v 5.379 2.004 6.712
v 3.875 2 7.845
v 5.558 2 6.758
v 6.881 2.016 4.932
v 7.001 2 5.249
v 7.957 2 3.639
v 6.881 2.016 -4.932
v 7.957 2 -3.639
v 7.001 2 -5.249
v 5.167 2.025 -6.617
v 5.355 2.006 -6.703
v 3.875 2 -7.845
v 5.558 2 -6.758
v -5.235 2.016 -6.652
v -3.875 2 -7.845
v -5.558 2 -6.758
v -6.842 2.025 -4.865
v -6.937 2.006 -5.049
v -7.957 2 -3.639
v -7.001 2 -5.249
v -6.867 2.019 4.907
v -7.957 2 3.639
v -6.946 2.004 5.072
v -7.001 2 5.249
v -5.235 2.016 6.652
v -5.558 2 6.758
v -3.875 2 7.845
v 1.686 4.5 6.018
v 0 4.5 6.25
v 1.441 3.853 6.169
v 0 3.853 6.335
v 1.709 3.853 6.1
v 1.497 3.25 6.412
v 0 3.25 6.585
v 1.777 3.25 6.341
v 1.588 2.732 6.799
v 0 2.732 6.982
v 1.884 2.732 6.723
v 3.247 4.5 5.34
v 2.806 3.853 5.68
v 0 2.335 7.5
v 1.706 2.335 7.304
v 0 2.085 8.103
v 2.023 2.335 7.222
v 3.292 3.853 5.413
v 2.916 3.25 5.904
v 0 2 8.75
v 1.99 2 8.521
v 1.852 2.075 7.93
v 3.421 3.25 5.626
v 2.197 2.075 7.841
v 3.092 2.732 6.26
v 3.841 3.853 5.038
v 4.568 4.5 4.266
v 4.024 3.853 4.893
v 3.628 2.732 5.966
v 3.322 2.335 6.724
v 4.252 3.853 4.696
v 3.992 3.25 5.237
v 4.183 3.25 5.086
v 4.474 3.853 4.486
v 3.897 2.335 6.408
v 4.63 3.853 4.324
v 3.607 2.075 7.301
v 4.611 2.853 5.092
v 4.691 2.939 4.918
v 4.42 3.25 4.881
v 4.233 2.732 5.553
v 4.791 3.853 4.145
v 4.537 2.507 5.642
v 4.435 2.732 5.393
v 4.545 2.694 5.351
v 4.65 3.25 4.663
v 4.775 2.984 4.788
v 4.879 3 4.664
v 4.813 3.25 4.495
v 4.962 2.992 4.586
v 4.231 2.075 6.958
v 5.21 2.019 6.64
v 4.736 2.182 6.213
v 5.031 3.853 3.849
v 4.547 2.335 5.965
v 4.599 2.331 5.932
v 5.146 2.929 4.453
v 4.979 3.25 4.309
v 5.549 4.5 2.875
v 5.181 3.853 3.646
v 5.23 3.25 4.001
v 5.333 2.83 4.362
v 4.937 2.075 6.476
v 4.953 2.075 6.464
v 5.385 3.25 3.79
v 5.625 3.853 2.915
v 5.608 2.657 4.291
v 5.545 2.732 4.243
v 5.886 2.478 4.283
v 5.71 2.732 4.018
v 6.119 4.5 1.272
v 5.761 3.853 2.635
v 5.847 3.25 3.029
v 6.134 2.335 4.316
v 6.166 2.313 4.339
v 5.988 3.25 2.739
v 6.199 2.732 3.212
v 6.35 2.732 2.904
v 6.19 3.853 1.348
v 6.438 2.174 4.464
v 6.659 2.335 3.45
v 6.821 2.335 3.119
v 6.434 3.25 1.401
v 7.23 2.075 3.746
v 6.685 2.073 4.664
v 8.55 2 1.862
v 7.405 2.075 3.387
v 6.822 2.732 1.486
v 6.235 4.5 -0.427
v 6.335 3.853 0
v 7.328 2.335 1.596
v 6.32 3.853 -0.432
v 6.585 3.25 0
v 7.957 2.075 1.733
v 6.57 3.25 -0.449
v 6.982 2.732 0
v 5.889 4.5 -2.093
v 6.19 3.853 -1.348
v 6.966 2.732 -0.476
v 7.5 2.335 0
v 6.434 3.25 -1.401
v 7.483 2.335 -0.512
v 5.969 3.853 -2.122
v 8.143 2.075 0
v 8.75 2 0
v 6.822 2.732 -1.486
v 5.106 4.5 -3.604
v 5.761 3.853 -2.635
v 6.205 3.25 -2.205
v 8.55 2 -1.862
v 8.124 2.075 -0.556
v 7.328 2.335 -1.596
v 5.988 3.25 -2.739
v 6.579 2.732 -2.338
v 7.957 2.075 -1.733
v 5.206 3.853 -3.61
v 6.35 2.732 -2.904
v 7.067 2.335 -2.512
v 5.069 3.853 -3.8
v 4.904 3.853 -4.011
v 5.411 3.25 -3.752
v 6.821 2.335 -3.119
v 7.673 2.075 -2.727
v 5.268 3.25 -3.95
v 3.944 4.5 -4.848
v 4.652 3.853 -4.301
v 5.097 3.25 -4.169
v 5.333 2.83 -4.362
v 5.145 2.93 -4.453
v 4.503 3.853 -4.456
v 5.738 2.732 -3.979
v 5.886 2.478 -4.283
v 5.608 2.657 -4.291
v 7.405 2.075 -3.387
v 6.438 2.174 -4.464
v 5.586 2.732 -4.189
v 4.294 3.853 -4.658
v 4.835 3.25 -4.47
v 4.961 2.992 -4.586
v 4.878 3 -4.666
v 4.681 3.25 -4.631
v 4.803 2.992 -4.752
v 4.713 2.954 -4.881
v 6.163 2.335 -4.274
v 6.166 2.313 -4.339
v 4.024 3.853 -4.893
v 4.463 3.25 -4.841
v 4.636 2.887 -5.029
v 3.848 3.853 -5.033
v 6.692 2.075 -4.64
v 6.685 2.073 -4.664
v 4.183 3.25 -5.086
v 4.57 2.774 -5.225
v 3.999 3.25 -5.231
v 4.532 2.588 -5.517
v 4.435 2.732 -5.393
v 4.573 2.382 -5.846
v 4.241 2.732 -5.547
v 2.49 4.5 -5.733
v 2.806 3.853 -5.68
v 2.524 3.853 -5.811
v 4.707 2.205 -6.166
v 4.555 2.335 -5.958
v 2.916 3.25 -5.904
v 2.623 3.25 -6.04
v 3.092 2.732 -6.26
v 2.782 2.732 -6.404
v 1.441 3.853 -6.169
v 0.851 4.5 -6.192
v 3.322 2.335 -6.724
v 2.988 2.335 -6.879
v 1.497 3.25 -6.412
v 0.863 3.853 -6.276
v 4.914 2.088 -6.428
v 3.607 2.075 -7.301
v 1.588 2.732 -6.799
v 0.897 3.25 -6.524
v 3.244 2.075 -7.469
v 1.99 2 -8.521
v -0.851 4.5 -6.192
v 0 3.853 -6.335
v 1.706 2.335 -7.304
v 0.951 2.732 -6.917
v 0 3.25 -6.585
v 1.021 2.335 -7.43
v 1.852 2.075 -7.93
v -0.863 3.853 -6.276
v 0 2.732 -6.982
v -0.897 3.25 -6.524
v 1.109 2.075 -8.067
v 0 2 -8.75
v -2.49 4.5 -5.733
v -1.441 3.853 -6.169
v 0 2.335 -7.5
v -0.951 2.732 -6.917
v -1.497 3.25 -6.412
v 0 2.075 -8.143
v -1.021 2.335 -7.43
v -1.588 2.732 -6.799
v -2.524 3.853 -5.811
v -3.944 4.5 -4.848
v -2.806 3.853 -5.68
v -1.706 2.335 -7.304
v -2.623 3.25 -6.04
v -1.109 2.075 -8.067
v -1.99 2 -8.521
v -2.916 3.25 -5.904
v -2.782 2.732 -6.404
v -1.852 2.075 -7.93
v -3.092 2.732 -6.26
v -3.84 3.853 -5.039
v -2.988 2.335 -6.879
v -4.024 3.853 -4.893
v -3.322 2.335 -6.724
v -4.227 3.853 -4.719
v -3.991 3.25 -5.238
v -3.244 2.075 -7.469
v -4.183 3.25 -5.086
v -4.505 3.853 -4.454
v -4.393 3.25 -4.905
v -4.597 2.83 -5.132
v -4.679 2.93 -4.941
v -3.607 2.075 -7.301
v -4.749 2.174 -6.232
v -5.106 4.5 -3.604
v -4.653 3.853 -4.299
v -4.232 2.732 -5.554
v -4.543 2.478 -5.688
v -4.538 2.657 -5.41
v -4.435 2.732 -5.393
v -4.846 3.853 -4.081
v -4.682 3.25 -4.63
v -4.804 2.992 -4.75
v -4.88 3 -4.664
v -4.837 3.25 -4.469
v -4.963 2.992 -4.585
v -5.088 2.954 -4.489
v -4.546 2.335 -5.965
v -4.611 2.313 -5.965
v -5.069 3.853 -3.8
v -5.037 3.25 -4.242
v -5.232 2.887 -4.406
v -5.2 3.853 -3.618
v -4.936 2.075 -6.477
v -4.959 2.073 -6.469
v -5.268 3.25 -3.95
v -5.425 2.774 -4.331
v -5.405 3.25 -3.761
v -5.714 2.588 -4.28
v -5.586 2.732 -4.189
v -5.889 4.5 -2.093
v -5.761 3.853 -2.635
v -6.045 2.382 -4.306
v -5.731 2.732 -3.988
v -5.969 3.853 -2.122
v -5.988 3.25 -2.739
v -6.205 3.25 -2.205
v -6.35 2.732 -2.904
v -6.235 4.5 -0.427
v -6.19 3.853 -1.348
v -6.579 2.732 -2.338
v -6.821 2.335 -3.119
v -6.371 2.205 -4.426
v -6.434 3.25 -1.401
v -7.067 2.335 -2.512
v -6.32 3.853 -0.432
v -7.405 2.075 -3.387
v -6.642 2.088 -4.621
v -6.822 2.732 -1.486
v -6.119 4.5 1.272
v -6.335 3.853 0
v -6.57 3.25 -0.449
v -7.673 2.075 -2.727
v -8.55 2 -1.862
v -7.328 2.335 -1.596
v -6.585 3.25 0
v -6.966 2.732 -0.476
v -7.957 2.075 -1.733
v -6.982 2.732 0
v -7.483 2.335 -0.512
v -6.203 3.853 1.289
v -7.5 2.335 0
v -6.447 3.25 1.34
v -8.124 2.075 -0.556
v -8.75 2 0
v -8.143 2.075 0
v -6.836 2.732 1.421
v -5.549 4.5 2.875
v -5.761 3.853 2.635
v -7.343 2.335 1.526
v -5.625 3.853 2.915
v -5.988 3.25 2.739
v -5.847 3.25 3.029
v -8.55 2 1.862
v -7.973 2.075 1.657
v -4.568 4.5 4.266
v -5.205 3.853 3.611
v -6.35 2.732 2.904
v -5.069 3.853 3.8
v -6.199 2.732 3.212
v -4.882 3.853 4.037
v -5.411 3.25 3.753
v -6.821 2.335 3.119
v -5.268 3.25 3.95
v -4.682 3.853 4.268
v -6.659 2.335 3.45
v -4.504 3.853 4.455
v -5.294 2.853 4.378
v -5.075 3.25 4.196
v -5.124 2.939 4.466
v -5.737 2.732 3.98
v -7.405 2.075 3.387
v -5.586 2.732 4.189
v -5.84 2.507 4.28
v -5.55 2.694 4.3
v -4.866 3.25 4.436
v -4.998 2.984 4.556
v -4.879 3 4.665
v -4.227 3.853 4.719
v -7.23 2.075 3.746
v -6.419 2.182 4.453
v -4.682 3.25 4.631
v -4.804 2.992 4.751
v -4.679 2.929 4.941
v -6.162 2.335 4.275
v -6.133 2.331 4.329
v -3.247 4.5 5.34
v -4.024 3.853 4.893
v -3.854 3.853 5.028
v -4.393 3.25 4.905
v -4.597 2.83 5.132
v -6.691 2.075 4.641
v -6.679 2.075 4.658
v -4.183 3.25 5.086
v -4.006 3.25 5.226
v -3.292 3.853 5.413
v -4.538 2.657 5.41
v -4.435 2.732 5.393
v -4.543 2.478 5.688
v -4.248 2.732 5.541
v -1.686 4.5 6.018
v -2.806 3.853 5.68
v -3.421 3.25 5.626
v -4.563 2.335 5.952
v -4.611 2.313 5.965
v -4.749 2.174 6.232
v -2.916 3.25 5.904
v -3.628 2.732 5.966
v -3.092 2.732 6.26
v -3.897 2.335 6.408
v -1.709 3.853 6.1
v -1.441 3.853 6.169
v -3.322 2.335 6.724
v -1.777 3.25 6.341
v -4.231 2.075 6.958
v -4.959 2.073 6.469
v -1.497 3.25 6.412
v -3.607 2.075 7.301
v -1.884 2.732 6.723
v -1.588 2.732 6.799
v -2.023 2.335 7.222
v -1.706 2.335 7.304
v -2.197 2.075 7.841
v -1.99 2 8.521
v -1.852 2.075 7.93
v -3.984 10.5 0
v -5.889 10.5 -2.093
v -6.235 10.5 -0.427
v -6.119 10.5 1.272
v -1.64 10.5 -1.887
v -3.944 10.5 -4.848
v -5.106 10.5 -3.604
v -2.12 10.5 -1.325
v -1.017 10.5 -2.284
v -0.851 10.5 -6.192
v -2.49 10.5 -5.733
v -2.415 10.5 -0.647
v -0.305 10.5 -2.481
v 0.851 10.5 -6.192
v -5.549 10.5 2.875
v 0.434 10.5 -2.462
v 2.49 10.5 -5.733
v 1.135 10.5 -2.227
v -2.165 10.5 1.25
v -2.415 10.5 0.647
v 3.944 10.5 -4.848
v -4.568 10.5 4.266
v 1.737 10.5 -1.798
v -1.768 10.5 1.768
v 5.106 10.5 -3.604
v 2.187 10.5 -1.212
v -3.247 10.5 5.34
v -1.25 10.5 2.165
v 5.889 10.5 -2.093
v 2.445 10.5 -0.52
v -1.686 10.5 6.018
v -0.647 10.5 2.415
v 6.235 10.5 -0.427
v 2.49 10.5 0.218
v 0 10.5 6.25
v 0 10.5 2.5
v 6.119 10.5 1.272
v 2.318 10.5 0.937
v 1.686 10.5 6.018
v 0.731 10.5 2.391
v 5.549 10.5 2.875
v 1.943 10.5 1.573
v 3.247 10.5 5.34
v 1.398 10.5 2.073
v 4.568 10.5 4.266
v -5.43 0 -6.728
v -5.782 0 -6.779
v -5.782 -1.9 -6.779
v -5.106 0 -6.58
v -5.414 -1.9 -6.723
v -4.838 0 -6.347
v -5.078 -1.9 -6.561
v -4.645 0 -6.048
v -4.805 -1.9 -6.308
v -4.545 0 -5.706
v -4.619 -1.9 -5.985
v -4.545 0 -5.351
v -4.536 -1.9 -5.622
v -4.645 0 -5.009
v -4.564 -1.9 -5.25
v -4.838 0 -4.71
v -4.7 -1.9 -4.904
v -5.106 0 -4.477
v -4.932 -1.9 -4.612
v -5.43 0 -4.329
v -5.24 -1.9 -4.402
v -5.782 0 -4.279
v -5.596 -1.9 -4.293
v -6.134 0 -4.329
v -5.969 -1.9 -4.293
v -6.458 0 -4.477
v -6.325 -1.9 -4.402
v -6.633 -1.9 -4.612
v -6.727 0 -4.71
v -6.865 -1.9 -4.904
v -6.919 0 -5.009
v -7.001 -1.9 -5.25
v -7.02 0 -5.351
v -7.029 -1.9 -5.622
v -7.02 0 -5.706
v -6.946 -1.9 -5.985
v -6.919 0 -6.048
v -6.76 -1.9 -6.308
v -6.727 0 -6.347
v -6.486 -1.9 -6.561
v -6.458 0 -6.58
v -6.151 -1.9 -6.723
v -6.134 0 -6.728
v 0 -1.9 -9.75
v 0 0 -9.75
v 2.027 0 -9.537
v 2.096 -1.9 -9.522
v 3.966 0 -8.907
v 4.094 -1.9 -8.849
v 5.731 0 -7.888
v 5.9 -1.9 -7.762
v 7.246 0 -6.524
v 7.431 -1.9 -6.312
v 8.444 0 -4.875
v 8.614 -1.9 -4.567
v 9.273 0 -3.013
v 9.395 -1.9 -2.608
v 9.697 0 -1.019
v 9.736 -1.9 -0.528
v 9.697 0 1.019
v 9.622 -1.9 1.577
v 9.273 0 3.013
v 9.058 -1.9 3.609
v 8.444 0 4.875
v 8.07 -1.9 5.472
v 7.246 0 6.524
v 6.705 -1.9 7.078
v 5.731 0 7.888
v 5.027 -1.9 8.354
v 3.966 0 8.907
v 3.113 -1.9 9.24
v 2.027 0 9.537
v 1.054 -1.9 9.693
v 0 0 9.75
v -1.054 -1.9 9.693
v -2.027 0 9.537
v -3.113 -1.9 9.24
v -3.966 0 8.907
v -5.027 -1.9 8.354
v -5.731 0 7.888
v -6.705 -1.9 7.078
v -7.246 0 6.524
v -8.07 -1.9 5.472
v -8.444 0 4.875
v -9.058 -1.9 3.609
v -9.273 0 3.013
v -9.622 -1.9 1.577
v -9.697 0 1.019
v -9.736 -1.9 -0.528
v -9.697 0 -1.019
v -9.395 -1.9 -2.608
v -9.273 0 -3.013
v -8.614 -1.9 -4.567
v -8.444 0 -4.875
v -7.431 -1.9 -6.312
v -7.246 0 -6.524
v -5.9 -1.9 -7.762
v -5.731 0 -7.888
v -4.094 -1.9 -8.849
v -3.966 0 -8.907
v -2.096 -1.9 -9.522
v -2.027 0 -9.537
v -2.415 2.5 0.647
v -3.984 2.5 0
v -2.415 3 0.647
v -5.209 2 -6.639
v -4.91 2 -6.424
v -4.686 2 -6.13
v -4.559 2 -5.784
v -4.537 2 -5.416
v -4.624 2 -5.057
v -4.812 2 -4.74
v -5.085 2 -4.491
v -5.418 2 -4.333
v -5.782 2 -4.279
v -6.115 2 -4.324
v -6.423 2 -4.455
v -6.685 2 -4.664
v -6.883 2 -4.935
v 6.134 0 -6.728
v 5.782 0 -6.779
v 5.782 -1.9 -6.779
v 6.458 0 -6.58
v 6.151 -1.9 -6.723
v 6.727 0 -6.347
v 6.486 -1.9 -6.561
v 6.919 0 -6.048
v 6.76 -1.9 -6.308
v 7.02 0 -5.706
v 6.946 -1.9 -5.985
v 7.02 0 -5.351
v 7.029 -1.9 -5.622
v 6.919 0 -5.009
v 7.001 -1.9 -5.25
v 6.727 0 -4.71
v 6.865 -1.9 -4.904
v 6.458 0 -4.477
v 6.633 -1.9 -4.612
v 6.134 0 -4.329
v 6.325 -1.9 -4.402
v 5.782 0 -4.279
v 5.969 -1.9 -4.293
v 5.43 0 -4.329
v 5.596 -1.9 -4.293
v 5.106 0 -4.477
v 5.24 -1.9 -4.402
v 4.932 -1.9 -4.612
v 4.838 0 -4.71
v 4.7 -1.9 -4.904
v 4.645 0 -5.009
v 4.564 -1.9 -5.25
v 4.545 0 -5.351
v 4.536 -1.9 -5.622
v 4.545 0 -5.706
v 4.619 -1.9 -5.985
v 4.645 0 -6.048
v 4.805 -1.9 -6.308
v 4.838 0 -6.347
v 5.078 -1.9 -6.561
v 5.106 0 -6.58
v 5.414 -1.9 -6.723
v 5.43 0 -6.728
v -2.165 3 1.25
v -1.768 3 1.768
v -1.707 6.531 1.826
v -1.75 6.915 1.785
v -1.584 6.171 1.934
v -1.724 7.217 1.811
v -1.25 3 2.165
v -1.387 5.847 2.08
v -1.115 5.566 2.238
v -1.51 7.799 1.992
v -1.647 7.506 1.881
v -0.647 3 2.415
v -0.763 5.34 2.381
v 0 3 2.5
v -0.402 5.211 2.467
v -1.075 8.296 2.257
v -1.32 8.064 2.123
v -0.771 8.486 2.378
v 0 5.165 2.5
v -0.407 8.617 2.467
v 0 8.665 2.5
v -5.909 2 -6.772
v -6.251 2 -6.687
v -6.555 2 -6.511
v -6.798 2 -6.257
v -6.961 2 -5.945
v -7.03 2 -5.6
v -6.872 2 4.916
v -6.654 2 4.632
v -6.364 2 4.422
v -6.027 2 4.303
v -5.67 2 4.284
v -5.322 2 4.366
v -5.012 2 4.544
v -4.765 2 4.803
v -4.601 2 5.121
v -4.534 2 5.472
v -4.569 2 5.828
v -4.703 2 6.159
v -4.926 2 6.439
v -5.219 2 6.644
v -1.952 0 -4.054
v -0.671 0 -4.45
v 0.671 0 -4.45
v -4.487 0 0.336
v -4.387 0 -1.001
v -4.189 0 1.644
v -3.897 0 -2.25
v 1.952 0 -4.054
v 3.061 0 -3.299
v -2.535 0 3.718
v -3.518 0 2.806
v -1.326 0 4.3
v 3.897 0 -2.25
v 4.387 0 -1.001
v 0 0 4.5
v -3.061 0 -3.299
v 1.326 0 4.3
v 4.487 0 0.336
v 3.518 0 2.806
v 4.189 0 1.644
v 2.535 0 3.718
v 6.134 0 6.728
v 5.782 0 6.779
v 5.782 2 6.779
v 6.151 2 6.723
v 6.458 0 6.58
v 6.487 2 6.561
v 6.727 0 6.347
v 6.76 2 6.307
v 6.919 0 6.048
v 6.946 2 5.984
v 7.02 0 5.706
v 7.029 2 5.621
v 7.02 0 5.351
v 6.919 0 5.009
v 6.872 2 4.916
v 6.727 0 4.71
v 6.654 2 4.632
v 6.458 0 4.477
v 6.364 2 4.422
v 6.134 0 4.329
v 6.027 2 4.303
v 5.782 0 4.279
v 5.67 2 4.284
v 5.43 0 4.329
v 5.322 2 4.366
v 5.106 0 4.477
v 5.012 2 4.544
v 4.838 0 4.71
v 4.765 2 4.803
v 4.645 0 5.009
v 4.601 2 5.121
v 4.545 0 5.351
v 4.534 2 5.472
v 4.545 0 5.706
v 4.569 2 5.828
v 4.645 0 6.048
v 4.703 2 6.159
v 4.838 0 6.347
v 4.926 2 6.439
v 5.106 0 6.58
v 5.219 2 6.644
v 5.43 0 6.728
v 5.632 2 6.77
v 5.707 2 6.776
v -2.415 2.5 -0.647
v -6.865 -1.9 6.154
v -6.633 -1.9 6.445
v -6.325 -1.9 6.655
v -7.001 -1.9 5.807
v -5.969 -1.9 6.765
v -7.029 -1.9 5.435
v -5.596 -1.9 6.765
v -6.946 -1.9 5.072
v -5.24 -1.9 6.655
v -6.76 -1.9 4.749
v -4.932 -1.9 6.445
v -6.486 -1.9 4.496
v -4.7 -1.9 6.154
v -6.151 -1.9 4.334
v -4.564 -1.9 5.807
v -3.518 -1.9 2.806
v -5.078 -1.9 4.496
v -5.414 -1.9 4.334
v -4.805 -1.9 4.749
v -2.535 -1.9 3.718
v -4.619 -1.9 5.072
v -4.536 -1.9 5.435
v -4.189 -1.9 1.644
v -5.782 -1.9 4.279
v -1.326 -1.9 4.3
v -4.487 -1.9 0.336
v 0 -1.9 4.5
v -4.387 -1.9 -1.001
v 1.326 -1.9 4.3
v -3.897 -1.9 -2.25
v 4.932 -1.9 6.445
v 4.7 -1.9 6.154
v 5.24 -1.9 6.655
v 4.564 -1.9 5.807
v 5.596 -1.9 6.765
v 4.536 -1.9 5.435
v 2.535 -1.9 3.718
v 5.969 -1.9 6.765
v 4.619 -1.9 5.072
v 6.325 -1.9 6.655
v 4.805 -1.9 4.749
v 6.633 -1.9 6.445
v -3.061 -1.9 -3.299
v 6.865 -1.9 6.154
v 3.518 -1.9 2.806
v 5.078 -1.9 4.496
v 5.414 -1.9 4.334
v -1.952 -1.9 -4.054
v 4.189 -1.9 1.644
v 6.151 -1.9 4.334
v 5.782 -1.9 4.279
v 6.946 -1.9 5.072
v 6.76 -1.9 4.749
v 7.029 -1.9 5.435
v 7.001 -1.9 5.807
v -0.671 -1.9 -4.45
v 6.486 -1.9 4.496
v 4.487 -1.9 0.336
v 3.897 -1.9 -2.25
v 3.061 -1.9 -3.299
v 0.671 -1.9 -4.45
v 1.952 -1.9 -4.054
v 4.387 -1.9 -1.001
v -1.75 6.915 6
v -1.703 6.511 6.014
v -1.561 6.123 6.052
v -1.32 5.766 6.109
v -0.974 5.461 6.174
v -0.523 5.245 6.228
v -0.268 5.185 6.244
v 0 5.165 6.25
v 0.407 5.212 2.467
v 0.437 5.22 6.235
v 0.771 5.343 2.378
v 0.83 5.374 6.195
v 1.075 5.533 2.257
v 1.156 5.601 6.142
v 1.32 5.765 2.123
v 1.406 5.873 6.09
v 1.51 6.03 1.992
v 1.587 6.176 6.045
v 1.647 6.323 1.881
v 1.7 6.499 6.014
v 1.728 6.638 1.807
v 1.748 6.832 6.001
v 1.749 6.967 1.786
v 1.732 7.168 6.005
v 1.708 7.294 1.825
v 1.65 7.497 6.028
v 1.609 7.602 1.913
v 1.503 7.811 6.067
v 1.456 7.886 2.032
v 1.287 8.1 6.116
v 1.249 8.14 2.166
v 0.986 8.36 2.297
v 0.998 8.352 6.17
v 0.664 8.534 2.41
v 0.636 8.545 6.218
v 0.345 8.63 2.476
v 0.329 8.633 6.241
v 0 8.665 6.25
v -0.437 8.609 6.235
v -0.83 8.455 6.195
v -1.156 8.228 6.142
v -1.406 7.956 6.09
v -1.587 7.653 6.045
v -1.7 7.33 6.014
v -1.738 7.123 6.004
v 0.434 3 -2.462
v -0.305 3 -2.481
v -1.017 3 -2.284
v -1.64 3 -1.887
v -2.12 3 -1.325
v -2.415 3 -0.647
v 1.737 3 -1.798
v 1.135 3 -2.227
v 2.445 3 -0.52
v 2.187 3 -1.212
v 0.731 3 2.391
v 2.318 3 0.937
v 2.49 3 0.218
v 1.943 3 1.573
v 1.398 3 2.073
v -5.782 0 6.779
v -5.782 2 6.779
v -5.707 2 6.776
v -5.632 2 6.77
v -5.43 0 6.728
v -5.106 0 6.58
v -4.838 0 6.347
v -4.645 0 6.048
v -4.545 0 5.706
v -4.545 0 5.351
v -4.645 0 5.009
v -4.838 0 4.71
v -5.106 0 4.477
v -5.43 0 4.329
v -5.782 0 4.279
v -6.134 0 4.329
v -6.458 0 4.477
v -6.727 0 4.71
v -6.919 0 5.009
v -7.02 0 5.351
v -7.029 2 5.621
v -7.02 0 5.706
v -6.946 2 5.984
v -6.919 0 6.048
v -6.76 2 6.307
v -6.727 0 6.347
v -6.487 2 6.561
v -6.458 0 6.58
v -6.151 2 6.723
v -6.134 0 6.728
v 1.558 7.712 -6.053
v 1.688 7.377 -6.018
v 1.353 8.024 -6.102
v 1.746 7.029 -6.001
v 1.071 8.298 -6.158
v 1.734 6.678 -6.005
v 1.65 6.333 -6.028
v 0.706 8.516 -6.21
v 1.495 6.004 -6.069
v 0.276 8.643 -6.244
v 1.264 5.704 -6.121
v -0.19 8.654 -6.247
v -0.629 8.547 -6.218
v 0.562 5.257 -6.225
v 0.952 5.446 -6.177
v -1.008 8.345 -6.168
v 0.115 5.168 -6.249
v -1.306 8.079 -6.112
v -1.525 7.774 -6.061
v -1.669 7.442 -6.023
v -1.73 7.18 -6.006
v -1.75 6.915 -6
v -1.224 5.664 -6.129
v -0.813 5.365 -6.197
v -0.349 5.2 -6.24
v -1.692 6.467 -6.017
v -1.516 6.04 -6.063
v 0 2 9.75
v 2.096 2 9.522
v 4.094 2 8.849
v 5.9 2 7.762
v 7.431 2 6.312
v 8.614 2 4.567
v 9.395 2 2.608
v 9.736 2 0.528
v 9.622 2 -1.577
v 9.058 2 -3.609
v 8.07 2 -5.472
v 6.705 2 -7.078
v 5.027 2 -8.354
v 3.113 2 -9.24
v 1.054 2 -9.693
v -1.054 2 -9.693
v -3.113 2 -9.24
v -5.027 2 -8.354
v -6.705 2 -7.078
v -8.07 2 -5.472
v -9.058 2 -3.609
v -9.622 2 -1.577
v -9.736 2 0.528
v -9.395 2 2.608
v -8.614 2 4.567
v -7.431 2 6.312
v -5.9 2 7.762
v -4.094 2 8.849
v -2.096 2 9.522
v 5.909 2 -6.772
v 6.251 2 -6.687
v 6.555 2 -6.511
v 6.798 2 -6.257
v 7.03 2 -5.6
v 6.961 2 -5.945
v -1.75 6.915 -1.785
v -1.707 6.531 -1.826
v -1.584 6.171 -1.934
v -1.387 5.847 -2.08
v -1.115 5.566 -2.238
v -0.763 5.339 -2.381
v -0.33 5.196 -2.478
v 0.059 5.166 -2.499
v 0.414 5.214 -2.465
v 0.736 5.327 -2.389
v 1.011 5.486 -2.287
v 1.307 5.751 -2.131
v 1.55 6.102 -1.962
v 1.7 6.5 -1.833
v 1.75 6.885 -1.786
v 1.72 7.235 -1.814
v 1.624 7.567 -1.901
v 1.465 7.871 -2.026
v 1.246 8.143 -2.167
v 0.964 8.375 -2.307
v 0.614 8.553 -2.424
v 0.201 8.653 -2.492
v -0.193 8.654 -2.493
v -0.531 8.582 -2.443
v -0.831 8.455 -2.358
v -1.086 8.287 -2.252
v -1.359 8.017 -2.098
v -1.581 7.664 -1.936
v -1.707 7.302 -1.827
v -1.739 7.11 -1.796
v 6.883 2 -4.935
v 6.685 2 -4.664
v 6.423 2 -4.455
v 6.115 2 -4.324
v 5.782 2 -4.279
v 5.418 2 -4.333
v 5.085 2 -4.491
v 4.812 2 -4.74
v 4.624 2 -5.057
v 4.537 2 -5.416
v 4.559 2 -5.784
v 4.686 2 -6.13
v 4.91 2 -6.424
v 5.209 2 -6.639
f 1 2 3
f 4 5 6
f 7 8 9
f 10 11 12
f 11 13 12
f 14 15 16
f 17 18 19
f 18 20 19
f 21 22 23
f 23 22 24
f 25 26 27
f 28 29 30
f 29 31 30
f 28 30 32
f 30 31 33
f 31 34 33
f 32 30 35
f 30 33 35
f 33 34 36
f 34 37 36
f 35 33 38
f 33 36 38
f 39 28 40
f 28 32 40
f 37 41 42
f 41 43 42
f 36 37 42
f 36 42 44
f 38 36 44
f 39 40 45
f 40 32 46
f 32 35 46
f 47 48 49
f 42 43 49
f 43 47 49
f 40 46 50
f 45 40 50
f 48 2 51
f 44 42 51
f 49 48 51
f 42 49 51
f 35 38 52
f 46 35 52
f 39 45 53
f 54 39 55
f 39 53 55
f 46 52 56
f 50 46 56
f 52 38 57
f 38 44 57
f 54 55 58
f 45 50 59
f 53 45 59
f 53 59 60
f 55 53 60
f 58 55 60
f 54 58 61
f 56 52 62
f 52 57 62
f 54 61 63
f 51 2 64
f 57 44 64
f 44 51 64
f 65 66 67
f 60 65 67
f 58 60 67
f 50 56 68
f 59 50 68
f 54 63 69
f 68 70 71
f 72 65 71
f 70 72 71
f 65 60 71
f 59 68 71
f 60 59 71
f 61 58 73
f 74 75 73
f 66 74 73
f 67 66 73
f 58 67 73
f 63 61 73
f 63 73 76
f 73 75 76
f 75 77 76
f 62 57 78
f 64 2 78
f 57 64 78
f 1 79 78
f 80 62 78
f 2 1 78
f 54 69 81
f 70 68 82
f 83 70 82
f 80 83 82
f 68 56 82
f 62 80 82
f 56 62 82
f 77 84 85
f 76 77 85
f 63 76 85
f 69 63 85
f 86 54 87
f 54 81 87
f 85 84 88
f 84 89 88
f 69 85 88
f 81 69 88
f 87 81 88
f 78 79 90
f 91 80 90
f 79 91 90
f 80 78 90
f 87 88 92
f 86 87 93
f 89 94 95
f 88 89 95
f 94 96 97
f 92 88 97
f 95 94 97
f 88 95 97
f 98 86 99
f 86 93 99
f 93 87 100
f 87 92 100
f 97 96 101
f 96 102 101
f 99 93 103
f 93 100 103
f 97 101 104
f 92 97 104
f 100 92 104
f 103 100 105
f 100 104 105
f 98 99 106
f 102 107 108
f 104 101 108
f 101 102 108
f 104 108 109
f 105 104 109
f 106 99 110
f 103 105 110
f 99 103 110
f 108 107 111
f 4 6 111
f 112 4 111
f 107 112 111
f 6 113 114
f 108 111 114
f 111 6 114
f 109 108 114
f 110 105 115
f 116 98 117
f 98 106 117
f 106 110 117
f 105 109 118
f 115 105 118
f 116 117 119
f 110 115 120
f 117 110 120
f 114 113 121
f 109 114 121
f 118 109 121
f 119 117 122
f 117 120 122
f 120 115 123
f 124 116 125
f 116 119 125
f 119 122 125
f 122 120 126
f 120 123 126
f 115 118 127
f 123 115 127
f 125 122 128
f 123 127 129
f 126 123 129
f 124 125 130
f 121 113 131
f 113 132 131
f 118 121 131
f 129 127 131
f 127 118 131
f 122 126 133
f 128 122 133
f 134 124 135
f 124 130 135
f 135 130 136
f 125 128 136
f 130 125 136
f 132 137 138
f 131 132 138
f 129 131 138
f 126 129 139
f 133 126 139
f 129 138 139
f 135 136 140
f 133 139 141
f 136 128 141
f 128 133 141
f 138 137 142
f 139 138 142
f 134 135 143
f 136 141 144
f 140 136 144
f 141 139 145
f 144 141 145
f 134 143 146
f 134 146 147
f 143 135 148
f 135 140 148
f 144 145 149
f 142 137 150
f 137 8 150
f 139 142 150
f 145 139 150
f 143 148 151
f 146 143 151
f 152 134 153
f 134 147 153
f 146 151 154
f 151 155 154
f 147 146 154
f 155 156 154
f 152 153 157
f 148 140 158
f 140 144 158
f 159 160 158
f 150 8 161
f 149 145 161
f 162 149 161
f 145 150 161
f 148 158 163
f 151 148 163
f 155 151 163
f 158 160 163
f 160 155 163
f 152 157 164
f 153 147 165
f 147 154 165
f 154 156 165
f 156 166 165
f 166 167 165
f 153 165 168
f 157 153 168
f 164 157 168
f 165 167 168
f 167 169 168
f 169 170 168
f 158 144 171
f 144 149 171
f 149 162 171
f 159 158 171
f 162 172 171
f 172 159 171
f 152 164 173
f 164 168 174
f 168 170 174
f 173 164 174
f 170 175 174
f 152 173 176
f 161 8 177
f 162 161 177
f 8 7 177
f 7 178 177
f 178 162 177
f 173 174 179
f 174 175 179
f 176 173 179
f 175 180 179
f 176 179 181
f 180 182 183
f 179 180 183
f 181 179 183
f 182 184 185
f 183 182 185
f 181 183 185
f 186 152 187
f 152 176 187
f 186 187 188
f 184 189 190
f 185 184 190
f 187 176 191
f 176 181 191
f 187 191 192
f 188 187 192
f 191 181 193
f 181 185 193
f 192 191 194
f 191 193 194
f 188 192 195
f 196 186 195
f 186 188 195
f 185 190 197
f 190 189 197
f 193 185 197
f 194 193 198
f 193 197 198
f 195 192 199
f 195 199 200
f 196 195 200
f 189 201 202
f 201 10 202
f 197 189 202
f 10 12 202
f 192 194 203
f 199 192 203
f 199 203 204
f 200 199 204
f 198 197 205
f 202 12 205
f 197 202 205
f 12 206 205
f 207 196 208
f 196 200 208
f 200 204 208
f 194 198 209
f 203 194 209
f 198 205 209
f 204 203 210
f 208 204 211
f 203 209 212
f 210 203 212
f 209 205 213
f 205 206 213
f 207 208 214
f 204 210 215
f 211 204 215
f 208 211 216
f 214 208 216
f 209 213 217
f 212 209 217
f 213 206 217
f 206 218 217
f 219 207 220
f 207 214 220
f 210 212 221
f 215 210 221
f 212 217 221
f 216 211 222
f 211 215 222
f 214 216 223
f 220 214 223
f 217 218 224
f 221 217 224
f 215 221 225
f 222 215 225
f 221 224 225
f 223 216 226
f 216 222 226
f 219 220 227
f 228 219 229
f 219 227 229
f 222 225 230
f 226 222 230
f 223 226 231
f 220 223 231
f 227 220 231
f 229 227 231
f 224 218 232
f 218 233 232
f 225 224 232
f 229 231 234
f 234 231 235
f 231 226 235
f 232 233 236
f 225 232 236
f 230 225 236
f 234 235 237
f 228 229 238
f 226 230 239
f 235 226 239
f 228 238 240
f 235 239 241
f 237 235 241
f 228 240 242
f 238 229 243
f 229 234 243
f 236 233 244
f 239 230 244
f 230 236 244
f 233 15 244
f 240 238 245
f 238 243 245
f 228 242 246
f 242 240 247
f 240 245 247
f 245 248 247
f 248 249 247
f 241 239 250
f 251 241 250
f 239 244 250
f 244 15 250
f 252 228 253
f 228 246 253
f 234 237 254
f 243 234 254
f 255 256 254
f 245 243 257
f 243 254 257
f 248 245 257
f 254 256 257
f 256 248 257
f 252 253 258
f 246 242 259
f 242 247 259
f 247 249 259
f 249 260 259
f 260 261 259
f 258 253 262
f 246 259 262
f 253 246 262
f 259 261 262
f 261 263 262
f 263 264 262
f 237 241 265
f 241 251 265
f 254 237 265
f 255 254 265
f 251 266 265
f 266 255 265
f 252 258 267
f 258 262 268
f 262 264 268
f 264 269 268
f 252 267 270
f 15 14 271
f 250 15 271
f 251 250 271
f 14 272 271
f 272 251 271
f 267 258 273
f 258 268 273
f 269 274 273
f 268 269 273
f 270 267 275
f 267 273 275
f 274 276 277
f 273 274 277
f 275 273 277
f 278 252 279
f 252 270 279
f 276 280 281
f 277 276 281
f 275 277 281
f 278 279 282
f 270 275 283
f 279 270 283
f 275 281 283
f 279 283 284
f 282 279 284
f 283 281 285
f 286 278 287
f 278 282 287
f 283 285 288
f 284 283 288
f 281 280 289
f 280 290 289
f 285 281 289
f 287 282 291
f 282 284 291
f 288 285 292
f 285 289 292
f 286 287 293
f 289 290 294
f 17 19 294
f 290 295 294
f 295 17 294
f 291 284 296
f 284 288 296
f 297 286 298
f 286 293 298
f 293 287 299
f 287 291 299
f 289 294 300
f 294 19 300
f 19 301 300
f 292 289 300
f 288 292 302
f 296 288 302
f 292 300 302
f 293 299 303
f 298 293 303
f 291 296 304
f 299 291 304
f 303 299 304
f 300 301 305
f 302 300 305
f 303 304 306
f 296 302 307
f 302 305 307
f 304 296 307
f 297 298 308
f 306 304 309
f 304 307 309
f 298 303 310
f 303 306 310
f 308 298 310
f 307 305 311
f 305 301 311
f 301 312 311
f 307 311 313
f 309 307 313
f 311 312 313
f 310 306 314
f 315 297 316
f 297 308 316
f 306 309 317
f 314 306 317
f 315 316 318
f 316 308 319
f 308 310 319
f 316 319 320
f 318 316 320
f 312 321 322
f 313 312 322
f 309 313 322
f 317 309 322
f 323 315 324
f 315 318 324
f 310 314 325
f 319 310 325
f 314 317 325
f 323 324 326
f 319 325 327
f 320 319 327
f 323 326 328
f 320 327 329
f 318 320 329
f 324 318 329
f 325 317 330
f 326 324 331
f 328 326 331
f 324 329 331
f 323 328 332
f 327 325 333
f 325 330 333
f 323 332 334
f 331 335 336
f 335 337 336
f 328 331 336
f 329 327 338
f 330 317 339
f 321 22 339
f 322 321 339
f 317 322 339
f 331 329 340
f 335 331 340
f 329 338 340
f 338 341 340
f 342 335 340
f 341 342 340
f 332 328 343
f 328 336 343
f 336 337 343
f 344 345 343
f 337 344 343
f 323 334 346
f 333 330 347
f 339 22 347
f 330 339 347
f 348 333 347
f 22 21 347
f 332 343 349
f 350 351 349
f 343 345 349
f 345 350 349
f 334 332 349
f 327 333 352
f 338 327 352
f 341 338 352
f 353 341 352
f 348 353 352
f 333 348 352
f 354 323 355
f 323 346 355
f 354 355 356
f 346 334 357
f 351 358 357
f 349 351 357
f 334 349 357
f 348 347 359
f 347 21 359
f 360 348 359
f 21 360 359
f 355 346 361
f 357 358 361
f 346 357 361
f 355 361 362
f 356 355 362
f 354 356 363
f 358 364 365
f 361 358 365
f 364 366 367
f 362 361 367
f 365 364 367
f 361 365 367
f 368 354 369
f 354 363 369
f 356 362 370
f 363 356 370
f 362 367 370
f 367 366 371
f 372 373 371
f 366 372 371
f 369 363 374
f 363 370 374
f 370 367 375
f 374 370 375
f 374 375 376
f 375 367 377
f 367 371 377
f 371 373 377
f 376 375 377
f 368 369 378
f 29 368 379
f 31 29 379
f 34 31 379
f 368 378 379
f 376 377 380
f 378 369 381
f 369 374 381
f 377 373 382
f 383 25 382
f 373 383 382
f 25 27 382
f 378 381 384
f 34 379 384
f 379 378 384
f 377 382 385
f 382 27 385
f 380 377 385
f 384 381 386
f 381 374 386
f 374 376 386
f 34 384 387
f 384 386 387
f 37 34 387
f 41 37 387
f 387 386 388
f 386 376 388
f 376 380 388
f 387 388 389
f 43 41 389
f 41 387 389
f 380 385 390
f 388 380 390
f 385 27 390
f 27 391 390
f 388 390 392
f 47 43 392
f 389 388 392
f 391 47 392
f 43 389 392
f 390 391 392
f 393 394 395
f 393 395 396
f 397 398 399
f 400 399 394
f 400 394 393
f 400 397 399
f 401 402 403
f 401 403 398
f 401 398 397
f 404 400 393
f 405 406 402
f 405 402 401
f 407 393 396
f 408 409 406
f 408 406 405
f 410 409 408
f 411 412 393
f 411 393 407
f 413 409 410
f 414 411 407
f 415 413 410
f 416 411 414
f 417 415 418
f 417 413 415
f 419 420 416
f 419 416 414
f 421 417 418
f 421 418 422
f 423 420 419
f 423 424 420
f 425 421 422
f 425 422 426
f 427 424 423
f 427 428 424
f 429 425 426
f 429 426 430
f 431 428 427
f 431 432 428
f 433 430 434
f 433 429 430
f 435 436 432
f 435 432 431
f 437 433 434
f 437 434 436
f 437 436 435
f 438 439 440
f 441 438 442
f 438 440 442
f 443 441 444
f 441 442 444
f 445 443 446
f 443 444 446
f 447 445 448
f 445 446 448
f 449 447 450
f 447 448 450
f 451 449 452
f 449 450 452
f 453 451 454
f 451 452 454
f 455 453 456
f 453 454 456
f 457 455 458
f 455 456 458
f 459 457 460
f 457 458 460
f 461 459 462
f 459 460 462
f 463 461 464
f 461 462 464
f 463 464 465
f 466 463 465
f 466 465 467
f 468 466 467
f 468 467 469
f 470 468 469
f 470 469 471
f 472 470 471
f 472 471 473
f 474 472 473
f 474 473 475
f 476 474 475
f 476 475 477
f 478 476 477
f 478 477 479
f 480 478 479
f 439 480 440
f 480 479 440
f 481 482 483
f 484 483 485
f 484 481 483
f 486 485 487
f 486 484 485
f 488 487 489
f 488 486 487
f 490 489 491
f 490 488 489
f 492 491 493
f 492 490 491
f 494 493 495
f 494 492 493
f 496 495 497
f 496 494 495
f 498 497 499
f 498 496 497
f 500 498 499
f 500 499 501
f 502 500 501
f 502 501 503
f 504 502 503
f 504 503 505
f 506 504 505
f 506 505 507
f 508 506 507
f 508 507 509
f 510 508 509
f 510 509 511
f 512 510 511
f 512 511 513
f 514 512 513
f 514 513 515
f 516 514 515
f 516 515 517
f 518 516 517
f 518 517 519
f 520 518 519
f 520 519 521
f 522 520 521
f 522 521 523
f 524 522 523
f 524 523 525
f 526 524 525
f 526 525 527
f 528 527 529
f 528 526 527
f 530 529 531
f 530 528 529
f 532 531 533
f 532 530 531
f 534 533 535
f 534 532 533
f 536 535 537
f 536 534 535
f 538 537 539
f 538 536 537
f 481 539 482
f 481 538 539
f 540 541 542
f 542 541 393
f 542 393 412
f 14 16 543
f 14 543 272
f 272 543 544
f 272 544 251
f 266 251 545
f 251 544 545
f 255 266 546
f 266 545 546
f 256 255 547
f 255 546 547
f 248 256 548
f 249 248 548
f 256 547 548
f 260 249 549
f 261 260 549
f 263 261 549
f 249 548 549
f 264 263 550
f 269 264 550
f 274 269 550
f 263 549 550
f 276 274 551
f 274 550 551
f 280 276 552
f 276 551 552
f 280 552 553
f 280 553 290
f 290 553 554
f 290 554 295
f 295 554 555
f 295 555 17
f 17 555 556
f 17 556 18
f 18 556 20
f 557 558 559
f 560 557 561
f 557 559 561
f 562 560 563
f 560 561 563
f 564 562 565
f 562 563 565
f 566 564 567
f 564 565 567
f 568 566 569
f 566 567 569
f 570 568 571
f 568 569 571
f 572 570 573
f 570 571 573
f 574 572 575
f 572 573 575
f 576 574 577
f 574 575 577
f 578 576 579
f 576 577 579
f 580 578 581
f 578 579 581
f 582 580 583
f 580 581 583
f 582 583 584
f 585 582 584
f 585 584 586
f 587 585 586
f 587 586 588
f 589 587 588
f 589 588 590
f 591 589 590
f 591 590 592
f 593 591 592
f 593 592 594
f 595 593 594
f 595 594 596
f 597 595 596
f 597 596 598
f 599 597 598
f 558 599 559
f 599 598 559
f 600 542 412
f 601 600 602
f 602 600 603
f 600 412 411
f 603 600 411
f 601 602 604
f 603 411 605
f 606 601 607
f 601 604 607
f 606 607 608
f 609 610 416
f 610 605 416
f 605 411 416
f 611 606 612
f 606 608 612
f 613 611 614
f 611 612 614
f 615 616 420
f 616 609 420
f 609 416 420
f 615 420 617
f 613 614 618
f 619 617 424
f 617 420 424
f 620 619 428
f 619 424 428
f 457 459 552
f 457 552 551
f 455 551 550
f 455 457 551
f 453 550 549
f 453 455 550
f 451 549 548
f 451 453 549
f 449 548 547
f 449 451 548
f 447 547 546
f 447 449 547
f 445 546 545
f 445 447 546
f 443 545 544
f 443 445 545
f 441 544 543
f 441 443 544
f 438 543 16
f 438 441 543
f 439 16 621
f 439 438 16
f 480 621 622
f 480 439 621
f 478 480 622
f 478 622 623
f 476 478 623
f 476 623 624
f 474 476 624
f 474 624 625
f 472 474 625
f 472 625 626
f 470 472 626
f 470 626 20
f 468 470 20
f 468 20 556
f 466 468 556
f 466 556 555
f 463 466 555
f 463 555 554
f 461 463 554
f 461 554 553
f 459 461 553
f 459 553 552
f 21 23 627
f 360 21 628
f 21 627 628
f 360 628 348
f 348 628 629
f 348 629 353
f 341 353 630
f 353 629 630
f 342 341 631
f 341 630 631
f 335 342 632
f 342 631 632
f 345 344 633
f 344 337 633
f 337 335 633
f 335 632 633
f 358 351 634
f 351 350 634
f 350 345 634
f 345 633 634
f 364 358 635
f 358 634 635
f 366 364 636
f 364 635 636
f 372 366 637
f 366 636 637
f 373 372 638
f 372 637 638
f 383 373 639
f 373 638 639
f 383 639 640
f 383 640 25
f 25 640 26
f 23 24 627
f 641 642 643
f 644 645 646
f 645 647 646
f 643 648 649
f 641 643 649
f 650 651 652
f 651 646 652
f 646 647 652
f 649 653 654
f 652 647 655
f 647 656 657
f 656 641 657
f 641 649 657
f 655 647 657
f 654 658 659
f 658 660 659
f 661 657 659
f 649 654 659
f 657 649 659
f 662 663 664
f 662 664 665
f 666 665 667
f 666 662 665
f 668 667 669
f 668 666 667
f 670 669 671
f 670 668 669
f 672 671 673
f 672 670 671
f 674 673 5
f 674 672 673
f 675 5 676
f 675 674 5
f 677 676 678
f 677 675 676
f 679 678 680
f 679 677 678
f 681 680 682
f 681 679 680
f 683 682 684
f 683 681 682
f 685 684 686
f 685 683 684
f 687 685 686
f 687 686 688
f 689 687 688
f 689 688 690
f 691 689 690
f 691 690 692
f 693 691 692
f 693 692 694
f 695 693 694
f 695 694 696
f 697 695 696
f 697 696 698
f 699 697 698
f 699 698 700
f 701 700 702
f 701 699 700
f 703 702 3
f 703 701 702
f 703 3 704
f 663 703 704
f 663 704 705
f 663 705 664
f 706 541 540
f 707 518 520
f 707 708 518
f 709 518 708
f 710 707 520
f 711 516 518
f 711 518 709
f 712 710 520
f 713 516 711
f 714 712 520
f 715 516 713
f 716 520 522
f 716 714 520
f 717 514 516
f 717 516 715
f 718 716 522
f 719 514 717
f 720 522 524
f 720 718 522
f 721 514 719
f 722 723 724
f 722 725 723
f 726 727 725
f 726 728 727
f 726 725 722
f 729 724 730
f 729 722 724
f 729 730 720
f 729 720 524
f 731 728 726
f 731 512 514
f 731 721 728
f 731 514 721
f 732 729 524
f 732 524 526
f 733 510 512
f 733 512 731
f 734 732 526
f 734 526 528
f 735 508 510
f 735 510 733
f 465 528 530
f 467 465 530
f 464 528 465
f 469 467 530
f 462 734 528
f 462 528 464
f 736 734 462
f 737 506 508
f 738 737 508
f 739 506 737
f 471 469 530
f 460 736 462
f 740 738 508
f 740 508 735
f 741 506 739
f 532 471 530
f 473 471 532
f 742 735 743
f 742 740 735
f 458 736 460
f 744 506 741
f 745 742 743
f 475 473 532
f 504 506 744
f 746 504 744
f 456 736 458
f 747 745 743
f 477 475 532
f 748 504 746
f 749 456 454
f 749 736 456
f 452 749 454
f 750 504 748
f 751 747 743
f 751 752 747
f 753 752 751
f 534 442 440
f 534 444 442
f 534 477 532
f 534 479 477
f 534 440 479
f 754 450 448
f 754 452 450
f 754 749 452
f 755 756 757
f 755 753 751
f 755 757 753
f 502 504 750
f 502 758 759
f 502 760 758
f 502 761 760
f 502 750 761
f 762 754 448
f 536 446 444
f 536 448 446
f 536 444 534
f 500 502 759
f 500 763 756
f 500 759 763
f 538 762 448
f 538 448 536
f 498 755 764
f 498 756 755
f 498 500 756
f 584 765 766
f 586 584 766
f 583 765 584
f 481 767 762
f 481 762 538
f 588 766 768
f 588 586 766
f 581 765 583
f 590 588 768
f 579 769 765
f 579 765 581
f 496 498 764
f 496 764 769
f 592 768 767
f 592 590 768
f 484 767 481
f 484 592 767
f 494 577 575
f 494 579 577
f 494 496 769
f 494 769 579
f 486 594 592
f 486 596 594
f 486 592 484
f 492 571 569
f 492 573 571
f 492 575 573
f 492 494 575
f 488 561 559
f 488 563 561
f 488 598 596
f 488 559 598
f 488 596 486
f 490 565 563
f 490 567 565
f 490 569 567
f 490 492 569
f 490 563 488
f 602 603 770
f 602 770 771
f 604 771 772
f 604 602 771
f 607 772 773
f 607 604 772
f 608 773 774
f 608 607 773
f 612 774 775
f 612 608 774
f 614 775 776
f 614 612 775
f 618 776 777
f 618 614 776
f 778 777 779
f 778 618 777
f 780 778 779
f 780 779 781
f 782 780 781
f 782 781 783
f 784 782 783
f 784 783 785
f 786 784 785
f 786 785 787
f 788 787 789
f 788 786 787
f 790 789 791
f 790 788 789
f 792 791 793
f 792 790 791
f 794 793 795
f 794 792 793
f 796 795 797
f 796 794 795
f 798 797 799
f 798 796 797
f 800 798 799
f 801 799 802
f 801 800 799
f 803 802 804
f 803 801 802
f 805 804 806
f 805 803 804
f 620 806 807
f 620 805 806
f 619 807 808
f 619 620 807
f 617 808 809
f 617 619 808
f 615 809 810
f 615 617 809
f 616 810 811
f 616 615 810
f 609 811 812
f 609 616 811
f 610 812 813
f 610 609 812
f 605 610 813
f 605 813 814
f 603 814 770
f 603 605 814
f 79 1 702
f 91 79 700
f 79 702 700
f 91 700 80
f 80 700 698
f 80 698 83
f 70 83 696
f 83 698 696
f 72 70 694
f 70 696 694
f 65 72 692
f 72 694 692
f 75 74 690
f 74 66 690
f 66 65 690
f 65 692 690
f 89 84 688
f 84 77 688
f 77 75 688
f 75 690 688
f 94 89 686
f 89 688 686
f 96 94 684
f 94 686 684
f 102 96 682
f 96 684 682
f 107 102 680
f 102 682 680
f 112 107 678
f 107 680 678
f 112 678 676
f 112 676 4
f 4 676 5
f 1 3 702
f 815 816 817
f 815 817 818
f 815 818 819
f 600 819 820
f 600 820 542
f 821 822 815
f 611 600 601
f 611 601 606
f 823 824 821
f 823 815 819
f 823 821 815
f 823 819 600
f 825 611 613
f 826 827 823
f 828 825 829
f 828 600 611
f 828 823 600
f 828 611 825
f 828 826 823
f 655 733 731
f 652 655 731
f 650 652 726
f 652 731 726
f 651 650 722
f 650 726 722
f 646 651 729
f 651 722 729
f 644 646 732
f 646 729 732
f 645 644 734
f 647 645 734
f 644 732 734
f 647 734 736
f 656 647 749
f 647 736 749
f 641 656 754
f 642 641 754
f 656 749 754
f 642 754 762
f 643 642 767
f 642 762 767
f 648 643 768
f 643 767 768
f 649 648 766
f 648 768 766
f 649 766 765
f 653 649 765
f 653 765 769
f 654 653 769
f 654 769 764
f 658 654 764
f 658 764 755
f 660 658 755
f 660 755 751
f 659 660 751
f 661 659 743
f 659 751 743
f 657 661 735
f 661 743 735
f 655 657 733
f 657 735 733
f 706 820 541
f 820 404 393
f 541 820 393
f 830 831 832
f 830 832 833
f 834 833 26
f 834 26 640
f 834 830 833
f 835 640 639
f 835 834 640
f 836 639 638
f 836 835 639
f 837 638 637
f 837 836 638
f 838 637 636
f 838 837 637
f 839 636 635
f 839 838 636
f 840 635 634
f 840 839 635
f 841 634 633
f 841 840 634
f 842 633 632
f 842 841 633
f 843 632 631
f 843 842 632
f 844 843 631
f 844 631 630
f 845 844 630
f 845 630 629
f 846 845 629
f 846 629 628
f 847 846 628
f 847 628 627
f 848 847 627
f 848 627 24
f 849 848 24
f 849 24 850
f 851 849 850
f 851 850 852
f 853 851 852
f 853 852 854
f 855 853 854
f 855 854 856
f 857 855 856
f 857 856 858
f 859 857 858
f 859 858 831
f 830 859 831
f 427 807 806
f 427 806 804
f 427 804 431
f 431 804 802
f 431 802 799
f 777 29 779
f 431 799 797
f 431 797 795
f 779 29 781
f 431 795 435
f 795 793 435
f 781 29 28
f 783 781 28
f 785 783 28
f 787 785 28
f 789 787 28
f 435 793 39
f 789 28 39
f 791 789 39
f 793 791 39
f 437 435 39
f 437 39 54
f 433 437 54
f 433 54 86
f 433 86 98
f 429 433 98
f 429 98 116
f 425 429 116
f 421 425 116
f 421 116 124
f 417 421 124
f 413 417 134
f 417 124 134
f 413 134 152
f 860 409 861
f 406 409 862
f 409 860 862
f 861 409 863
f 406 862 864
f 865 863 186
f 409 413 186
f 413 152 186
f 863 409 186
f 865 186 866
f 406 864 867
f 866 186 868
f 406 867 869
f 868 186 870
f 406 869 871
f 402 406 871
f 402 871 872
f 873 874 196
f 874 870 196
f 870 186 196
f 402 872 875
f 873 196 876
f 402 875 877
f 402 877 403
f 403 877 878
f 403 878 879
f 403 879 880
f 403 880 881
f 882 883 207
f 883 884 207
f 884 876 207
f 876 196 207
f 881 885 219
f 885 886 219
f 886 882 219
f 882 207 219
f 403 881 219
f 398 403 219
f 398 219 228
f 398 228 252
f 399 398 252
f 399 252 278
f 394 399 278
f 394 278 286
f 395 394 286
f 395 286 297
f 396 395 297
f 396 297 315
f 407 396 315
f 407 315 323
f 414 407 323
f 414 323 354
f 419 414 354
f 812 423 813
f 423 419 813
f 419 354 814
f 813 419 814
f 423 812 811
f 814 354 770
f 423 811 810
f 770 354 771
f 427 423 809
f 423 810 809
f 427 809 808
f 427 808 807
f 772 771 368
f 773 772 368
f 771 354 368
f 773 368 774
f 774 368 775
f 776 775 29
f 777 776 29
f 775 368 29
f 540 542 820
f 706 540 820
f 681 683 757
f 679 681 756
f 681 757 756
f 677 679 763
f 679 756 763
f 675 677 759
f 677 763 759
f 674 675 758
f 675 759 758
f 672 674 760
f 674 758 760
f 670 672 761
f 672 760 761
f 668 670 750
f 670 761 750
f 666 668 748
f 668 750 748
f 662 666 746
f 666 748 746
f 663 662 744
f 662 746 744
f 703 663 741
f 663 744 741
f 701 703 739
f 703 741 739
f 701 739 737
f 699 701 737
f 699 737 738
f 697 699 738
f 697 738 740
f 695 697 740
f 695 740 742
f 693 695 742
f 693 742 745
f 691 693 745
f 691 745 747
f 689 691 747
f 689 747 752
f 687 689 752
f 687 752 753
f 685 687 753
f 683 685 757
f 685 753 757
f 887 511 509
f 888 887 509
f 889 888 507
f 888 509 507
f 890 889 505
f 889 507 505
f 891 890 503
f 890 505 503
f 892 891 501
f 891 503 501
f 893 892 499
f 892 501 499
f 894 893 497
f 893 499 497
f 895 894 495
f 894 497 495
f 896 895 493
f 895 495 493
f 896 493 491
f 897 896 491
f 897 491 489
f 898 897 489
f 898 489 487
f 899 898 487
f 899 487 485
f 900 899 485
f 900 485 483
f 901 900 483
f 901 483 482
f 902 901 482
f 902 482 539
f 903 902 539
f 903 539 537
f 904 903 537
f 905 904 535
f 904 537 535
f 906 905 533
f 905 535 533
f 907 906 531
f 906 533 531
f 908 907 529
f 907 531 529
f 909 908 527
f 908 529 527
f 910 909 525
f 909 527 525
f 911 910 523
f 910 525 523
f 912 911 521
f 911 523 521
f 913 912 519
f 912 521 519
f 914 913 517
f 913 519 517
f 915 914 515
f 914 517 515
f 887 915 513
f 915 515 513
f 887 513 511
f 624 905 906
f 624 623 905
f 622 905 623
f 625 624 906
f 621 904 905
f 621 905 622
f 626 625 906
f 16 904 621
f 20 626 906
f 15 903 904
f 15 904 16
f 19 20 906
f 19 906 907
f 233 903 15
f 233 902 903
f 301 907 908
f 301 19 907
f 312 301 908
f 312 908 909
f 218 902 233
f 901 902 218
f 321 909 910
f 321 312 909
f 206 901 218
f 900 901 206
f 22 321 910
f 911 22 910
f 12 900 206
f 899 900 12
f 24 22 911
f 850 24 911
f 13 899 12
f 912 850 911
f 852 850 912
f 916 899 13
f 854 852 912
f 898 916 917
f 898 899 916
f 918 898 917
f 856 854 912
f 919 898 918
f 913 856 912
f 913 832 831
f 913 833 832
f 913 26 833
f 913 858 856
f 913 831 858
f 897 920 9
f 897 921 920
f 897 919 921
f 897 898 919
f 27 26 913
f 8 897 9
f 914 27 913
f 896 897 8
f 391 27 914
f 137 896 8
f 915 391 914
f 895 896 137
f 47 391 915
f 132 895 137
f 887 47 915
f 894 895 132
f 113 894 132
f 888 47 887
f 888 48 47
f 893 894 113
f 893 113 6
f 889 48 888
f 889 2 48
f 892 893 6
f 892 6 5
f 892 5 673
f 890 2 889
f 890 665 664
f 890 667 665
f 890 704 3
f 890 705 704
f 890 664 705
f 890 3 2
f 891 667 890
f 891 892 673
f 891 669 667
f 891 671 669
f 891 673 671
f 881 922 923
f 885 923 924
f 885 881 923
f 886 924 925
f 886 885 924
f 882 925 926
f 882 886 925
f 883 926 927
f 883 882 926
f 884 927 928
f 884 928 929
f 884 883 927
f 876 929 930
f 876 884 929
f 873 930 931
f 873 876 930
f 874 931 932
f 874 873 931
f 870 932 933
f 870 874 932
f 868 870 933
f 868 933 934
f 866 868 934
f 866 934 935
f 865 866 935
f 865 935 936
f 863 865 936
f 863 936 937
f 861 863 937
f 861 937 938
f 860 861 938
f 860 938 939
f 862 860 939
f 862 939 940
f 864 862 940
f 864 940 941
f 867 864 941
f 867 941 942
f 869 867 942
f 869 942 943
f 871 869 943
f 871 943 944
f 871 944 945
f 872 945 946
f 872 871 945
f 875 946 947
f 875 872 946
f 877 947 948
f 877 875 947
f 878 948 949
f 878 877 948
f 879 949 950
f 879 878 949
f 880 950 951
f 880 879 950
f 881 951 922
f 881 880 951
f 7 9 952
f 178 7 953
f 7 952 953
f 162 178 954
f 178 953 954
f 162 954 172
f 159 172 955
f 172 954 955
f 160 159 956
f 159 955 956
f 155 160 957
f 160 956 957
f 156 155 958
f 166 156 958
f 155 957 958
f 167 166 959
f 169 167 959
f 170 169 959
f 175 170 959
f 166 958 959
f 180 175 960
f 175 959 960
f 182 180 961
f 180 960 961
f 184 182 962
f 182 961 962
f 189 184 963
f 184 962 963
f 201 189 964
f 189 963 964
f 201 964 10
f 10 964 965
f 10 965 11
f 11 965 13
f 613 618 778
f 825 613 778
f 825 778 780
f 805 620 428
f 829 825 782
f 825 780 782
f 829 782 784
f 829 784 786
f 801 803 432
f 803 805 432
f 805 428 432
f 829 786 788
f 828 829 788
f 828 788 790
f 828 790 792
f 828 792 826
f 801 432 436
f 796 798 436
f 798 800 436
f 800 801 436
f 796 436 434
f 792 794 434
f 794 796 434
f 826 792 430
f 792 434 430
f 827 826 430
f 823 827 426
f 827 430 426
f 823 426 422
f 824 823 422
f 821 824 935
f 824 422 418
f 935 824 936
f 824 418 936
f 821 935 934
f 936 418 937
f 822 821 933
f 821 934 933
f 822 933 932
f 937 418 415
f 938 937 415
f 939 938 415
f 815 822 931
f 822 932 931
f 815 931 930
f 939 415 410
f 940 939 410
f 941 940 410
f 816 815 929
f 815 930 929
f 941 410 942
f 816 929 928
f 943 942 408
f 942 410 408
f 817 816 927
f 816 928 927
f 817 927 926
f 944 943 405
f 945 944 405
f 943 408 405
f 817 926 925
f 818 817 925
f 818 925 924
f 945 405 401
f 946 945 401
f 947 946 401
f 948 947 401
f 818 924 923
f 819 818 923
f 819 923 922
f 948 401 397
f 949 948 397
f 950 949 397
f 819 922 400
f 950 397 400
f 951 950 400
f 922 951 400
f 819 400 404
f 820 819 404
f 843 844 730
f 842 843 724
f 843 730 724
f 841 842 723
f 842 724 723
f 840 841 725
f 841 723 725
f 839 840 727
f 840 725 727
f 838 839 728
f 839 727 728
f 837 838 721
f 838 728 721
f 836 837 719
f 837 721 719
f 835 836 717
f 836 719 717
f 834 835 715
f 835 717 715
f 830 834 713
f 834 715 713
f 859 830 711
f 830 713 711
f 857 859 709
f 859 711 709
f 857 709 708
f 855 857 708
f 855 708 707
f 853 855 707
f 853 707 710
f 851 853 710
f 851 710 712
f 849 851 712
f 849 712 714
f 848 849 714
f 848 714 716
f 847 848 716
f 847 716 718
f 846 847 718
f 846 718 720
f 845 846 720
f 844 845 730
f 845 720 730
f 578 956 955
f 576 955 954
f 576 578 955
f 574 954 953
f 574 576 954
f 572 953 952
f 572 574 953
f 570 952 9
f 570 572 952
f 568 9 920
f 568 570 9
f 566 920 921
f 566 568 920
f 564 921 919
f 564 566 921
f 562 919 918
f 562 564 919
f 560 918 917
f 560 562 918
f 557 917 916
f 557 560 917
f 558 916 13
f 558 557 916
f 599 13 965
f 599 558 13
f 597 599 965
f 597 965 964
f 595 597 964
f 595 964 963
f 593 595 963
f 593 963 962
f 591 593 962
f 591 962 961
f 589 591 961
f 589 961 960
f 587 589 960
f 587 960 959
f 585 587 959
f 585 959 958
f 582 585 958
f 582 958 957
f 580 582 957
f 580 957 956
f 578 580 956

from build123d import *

# Parameters (mm, degrees)
SKETCH1_R               = 9.75
SKETCH1_R_2             = 1.25
BOSS_EXTRUDE2_DEPTH     = 2
SKETCH2_R               = 6.25
BOSS_EXTRUDE3_DEPTH     = 8.5
SKETCH4_R               = 2.5
CUT_EXTRUDE1_DEPTH      = 7.5
CUT_EXTRUDE2_DEPTH      = 7.5
CUT_EXTRUDE2_DEPTH_BACK = 6.75
SKETCH5_R               = 1.75
BOSS_EXTRUDE5_START     = 1.9
SKETCH7_R               = 9.75
SKETCH7_R_2             = 4.5
SKETCH7_R_3             = 1.25
BOSS_EXTRUDE5_DEPTH     = 1.9
CUT_EXTRUDE3_DEPTH      = 8
FILLET1_R               = 2.5


with BuildPart() as part:
    # Sketch1 → Boss-Extrude2 (new body)
    with BuildSketch(Plane(origin=(0, 0, 0), x_dir=(1, 0, 0), z_dir=(0, 1, 0))):
        with Locations(Location((0, 0, 0), (0, 0, 270))):
            Circle(SKETCH1_R)
        with Locations(Location((-5.78230038, 5.52856241, 0), (0, 0, 270))):
            Circle(SKETCH1_R_2, mode=Mode.SUBTRACT)
        with Locations(Location((-5.78230038, -5.52856241, 0), (0, 0, 270))):
            Circle(SKETCH1_R_2, mode=Mode.SUBTRACT)
        with Locations(Location((5.78230038, -5.52856241, 0), (0, 0, 270))):
            Circle(SKETCH1_R_2, mode=Mode.SUBTRACT)
        with Locations(Location((5.78230038, 5.52856241, 0), (0, 0, 270))):
            Circle(SKETCH1_R_2, mode=Mode.SUBTRACT)
    extrude(amount=BOSS_EXTRUDE2_DEPTH)

    # Sketch2 → Boss-Extrude3 (add)
    with BuildSketch(Plane(origin=(0, 2, 0), x_dir=(1, 0, 0), z_dir=(0, 1, 0))):
        with Locations(Location((0, 0, 0), (0, 0, 270))):
            Circle(SKETCH2_R)
    extrude(amount=BOSS_EXTRUDE3_DEPTH)

    # Sketch4 → Cut-Extrude1 (cut)
    with BuildSketch(Plane(origin=(0, 10.5, 0), x_dir=(1, 0, 0), z_dir=(0, 1, 0))):
        with Locations(Location((0, 0, 0), (0, 0, 270))):
            Circle(SKETCH4_R)
    extrude(amount=-CUT_EXTRUDE1_DEPTH, mode=Mode.SUBTRACT)

    # Sketch5 → Cut-Extrude2 (cut, two sides: drawn at the far end of the back side and taken through both)
    with BuildSketch(Plane.XY.offset(-CUT_EXTRUDE2_DEPTH_BACK)):
        with Locations(Location((0, 6.914506731, 0), (0, 0, 180))):
            Circle(SKETCH5_R)
    extrude(amount=CUT_EXTRUDE2_DEPTH + CUT_EXTRUDE2_DEPTH_BACK, mode=Mode.SUBTRACT)

    # Sketch7 → Boss-Extrude5 (add)
    with BuildSketch(Plane.XZ.offset(BOSS_EXTRUDE5_START)):
        with Locations(Location((0, 0, 0), (0, 0, 270))):
            Circle(SKETCH7_R)
        with Locations(Location((0, 0, 0), (0, 0, 90))):
            Circle(SKETCH7_R_2, mode=Mode.SUBTRACT)
        with Locations(Location((-5.78230038, 5.52856241, 0), (0, 0, 270))):
            Circle(SKETCH7_R_3, mode=Mode.SUBTRACT)
        with Locations(Location((5.78230038, 5.52856241, 0), (0, 0, 270))):
            Circle(SKETCH7_R_3, mode=Mode.SUBTRACT)
        with Locations(Location((5.78230038, -5.52856241, 0), (0, 0, 270))):
            Circle(SKETCH7_R_3, mode=Mode.SUBTRACT)
        with Locations(Location((-5.78230038, -5.52856241, 0), (0, 0, 270))):
            Circle(SKETCH7_R_3, mode=Mode.SUBTRACT)
    extrude(amount=-BOSS_EXTRUDE5_DEPTH)

    # Sketch9 → Cut-Extrude3 (cut)
    with BuildSketch(Plane(origin=(0, 10.5, 0), x_dir=(1, 0, 0), z_dir=(0, 1, 0))):
        Polygon((-2.414753661, -0.64727487), (-2.414753661, 0.64727487), (-3.984419716, 0), align=None)
    extrude(amount=-CUT_EXTRUDE3_DEPTH, mode=Mode.SUBTRACT)

    # Fillet1
    # the kernel refuses this fillet: 2.5 mm, written as the material it adds along each edge
    with BuildSketch(Plane(origin=(0, 2, 0), x_dir=(0, 0, 1), z_dir=(-1, 0, 0))) as fillet1_piece_1_section:
        with BuildLine():
            CenterArc((6.25 + FILLET1_R, FILLET1_R), FILLET1_R, 180, 90)
            Line((6.25, FILLET1_R), (6.25, 0))
            Line((6.25, 0), (6.25 + FILLET1_R, 0))
        make_face()
    fillet1_piece_1 = revolve(axis=Axis((0, 2, 0), (0, 1, 0)), mode=Mode.PRIVATE)
    fillet1_piece_1 = fillet1_piece_1 - Plane(origin=(-5.78230038, 2.704024644, 5.52856241), x_dir=(0, 0, 1), z_dir=(0, -1, 0)) * Cylinder(1.25, 35, mode=Mode.PRIVATE)
    fillet1_piece_1 = fillet1_piece_1 - Plane(origin=(5.78230038, 2.704024644, 5.52856241), x_dir=(0, 0, 1), z_dir=(0, -1, 0)) * Cylinder(1.25, 35, mode=Mode.PRIVATE)
    fillet1_piece_1 = fillet1_piece_1 - Plane(origin=(-5.78230038, 2.704024644, -5.52856241), x_dir=(0, 0, 1), z_dir=(0, -1, 0)) * Cylinder(1.25, 35, mode=Mode.PRIVATE)
    fillet1_piece_1 = fillet1_piece_1 - Plane(origin=(5.78230038, 2.704024644, -5.52856241), x_dir=(0, 0, 1), z_dir=(0, -1, 0)) * Cylinder(1.25, 35, mode=Mode.PRIVATE)
    add(fillet1_piece_1)


solid = part.part
